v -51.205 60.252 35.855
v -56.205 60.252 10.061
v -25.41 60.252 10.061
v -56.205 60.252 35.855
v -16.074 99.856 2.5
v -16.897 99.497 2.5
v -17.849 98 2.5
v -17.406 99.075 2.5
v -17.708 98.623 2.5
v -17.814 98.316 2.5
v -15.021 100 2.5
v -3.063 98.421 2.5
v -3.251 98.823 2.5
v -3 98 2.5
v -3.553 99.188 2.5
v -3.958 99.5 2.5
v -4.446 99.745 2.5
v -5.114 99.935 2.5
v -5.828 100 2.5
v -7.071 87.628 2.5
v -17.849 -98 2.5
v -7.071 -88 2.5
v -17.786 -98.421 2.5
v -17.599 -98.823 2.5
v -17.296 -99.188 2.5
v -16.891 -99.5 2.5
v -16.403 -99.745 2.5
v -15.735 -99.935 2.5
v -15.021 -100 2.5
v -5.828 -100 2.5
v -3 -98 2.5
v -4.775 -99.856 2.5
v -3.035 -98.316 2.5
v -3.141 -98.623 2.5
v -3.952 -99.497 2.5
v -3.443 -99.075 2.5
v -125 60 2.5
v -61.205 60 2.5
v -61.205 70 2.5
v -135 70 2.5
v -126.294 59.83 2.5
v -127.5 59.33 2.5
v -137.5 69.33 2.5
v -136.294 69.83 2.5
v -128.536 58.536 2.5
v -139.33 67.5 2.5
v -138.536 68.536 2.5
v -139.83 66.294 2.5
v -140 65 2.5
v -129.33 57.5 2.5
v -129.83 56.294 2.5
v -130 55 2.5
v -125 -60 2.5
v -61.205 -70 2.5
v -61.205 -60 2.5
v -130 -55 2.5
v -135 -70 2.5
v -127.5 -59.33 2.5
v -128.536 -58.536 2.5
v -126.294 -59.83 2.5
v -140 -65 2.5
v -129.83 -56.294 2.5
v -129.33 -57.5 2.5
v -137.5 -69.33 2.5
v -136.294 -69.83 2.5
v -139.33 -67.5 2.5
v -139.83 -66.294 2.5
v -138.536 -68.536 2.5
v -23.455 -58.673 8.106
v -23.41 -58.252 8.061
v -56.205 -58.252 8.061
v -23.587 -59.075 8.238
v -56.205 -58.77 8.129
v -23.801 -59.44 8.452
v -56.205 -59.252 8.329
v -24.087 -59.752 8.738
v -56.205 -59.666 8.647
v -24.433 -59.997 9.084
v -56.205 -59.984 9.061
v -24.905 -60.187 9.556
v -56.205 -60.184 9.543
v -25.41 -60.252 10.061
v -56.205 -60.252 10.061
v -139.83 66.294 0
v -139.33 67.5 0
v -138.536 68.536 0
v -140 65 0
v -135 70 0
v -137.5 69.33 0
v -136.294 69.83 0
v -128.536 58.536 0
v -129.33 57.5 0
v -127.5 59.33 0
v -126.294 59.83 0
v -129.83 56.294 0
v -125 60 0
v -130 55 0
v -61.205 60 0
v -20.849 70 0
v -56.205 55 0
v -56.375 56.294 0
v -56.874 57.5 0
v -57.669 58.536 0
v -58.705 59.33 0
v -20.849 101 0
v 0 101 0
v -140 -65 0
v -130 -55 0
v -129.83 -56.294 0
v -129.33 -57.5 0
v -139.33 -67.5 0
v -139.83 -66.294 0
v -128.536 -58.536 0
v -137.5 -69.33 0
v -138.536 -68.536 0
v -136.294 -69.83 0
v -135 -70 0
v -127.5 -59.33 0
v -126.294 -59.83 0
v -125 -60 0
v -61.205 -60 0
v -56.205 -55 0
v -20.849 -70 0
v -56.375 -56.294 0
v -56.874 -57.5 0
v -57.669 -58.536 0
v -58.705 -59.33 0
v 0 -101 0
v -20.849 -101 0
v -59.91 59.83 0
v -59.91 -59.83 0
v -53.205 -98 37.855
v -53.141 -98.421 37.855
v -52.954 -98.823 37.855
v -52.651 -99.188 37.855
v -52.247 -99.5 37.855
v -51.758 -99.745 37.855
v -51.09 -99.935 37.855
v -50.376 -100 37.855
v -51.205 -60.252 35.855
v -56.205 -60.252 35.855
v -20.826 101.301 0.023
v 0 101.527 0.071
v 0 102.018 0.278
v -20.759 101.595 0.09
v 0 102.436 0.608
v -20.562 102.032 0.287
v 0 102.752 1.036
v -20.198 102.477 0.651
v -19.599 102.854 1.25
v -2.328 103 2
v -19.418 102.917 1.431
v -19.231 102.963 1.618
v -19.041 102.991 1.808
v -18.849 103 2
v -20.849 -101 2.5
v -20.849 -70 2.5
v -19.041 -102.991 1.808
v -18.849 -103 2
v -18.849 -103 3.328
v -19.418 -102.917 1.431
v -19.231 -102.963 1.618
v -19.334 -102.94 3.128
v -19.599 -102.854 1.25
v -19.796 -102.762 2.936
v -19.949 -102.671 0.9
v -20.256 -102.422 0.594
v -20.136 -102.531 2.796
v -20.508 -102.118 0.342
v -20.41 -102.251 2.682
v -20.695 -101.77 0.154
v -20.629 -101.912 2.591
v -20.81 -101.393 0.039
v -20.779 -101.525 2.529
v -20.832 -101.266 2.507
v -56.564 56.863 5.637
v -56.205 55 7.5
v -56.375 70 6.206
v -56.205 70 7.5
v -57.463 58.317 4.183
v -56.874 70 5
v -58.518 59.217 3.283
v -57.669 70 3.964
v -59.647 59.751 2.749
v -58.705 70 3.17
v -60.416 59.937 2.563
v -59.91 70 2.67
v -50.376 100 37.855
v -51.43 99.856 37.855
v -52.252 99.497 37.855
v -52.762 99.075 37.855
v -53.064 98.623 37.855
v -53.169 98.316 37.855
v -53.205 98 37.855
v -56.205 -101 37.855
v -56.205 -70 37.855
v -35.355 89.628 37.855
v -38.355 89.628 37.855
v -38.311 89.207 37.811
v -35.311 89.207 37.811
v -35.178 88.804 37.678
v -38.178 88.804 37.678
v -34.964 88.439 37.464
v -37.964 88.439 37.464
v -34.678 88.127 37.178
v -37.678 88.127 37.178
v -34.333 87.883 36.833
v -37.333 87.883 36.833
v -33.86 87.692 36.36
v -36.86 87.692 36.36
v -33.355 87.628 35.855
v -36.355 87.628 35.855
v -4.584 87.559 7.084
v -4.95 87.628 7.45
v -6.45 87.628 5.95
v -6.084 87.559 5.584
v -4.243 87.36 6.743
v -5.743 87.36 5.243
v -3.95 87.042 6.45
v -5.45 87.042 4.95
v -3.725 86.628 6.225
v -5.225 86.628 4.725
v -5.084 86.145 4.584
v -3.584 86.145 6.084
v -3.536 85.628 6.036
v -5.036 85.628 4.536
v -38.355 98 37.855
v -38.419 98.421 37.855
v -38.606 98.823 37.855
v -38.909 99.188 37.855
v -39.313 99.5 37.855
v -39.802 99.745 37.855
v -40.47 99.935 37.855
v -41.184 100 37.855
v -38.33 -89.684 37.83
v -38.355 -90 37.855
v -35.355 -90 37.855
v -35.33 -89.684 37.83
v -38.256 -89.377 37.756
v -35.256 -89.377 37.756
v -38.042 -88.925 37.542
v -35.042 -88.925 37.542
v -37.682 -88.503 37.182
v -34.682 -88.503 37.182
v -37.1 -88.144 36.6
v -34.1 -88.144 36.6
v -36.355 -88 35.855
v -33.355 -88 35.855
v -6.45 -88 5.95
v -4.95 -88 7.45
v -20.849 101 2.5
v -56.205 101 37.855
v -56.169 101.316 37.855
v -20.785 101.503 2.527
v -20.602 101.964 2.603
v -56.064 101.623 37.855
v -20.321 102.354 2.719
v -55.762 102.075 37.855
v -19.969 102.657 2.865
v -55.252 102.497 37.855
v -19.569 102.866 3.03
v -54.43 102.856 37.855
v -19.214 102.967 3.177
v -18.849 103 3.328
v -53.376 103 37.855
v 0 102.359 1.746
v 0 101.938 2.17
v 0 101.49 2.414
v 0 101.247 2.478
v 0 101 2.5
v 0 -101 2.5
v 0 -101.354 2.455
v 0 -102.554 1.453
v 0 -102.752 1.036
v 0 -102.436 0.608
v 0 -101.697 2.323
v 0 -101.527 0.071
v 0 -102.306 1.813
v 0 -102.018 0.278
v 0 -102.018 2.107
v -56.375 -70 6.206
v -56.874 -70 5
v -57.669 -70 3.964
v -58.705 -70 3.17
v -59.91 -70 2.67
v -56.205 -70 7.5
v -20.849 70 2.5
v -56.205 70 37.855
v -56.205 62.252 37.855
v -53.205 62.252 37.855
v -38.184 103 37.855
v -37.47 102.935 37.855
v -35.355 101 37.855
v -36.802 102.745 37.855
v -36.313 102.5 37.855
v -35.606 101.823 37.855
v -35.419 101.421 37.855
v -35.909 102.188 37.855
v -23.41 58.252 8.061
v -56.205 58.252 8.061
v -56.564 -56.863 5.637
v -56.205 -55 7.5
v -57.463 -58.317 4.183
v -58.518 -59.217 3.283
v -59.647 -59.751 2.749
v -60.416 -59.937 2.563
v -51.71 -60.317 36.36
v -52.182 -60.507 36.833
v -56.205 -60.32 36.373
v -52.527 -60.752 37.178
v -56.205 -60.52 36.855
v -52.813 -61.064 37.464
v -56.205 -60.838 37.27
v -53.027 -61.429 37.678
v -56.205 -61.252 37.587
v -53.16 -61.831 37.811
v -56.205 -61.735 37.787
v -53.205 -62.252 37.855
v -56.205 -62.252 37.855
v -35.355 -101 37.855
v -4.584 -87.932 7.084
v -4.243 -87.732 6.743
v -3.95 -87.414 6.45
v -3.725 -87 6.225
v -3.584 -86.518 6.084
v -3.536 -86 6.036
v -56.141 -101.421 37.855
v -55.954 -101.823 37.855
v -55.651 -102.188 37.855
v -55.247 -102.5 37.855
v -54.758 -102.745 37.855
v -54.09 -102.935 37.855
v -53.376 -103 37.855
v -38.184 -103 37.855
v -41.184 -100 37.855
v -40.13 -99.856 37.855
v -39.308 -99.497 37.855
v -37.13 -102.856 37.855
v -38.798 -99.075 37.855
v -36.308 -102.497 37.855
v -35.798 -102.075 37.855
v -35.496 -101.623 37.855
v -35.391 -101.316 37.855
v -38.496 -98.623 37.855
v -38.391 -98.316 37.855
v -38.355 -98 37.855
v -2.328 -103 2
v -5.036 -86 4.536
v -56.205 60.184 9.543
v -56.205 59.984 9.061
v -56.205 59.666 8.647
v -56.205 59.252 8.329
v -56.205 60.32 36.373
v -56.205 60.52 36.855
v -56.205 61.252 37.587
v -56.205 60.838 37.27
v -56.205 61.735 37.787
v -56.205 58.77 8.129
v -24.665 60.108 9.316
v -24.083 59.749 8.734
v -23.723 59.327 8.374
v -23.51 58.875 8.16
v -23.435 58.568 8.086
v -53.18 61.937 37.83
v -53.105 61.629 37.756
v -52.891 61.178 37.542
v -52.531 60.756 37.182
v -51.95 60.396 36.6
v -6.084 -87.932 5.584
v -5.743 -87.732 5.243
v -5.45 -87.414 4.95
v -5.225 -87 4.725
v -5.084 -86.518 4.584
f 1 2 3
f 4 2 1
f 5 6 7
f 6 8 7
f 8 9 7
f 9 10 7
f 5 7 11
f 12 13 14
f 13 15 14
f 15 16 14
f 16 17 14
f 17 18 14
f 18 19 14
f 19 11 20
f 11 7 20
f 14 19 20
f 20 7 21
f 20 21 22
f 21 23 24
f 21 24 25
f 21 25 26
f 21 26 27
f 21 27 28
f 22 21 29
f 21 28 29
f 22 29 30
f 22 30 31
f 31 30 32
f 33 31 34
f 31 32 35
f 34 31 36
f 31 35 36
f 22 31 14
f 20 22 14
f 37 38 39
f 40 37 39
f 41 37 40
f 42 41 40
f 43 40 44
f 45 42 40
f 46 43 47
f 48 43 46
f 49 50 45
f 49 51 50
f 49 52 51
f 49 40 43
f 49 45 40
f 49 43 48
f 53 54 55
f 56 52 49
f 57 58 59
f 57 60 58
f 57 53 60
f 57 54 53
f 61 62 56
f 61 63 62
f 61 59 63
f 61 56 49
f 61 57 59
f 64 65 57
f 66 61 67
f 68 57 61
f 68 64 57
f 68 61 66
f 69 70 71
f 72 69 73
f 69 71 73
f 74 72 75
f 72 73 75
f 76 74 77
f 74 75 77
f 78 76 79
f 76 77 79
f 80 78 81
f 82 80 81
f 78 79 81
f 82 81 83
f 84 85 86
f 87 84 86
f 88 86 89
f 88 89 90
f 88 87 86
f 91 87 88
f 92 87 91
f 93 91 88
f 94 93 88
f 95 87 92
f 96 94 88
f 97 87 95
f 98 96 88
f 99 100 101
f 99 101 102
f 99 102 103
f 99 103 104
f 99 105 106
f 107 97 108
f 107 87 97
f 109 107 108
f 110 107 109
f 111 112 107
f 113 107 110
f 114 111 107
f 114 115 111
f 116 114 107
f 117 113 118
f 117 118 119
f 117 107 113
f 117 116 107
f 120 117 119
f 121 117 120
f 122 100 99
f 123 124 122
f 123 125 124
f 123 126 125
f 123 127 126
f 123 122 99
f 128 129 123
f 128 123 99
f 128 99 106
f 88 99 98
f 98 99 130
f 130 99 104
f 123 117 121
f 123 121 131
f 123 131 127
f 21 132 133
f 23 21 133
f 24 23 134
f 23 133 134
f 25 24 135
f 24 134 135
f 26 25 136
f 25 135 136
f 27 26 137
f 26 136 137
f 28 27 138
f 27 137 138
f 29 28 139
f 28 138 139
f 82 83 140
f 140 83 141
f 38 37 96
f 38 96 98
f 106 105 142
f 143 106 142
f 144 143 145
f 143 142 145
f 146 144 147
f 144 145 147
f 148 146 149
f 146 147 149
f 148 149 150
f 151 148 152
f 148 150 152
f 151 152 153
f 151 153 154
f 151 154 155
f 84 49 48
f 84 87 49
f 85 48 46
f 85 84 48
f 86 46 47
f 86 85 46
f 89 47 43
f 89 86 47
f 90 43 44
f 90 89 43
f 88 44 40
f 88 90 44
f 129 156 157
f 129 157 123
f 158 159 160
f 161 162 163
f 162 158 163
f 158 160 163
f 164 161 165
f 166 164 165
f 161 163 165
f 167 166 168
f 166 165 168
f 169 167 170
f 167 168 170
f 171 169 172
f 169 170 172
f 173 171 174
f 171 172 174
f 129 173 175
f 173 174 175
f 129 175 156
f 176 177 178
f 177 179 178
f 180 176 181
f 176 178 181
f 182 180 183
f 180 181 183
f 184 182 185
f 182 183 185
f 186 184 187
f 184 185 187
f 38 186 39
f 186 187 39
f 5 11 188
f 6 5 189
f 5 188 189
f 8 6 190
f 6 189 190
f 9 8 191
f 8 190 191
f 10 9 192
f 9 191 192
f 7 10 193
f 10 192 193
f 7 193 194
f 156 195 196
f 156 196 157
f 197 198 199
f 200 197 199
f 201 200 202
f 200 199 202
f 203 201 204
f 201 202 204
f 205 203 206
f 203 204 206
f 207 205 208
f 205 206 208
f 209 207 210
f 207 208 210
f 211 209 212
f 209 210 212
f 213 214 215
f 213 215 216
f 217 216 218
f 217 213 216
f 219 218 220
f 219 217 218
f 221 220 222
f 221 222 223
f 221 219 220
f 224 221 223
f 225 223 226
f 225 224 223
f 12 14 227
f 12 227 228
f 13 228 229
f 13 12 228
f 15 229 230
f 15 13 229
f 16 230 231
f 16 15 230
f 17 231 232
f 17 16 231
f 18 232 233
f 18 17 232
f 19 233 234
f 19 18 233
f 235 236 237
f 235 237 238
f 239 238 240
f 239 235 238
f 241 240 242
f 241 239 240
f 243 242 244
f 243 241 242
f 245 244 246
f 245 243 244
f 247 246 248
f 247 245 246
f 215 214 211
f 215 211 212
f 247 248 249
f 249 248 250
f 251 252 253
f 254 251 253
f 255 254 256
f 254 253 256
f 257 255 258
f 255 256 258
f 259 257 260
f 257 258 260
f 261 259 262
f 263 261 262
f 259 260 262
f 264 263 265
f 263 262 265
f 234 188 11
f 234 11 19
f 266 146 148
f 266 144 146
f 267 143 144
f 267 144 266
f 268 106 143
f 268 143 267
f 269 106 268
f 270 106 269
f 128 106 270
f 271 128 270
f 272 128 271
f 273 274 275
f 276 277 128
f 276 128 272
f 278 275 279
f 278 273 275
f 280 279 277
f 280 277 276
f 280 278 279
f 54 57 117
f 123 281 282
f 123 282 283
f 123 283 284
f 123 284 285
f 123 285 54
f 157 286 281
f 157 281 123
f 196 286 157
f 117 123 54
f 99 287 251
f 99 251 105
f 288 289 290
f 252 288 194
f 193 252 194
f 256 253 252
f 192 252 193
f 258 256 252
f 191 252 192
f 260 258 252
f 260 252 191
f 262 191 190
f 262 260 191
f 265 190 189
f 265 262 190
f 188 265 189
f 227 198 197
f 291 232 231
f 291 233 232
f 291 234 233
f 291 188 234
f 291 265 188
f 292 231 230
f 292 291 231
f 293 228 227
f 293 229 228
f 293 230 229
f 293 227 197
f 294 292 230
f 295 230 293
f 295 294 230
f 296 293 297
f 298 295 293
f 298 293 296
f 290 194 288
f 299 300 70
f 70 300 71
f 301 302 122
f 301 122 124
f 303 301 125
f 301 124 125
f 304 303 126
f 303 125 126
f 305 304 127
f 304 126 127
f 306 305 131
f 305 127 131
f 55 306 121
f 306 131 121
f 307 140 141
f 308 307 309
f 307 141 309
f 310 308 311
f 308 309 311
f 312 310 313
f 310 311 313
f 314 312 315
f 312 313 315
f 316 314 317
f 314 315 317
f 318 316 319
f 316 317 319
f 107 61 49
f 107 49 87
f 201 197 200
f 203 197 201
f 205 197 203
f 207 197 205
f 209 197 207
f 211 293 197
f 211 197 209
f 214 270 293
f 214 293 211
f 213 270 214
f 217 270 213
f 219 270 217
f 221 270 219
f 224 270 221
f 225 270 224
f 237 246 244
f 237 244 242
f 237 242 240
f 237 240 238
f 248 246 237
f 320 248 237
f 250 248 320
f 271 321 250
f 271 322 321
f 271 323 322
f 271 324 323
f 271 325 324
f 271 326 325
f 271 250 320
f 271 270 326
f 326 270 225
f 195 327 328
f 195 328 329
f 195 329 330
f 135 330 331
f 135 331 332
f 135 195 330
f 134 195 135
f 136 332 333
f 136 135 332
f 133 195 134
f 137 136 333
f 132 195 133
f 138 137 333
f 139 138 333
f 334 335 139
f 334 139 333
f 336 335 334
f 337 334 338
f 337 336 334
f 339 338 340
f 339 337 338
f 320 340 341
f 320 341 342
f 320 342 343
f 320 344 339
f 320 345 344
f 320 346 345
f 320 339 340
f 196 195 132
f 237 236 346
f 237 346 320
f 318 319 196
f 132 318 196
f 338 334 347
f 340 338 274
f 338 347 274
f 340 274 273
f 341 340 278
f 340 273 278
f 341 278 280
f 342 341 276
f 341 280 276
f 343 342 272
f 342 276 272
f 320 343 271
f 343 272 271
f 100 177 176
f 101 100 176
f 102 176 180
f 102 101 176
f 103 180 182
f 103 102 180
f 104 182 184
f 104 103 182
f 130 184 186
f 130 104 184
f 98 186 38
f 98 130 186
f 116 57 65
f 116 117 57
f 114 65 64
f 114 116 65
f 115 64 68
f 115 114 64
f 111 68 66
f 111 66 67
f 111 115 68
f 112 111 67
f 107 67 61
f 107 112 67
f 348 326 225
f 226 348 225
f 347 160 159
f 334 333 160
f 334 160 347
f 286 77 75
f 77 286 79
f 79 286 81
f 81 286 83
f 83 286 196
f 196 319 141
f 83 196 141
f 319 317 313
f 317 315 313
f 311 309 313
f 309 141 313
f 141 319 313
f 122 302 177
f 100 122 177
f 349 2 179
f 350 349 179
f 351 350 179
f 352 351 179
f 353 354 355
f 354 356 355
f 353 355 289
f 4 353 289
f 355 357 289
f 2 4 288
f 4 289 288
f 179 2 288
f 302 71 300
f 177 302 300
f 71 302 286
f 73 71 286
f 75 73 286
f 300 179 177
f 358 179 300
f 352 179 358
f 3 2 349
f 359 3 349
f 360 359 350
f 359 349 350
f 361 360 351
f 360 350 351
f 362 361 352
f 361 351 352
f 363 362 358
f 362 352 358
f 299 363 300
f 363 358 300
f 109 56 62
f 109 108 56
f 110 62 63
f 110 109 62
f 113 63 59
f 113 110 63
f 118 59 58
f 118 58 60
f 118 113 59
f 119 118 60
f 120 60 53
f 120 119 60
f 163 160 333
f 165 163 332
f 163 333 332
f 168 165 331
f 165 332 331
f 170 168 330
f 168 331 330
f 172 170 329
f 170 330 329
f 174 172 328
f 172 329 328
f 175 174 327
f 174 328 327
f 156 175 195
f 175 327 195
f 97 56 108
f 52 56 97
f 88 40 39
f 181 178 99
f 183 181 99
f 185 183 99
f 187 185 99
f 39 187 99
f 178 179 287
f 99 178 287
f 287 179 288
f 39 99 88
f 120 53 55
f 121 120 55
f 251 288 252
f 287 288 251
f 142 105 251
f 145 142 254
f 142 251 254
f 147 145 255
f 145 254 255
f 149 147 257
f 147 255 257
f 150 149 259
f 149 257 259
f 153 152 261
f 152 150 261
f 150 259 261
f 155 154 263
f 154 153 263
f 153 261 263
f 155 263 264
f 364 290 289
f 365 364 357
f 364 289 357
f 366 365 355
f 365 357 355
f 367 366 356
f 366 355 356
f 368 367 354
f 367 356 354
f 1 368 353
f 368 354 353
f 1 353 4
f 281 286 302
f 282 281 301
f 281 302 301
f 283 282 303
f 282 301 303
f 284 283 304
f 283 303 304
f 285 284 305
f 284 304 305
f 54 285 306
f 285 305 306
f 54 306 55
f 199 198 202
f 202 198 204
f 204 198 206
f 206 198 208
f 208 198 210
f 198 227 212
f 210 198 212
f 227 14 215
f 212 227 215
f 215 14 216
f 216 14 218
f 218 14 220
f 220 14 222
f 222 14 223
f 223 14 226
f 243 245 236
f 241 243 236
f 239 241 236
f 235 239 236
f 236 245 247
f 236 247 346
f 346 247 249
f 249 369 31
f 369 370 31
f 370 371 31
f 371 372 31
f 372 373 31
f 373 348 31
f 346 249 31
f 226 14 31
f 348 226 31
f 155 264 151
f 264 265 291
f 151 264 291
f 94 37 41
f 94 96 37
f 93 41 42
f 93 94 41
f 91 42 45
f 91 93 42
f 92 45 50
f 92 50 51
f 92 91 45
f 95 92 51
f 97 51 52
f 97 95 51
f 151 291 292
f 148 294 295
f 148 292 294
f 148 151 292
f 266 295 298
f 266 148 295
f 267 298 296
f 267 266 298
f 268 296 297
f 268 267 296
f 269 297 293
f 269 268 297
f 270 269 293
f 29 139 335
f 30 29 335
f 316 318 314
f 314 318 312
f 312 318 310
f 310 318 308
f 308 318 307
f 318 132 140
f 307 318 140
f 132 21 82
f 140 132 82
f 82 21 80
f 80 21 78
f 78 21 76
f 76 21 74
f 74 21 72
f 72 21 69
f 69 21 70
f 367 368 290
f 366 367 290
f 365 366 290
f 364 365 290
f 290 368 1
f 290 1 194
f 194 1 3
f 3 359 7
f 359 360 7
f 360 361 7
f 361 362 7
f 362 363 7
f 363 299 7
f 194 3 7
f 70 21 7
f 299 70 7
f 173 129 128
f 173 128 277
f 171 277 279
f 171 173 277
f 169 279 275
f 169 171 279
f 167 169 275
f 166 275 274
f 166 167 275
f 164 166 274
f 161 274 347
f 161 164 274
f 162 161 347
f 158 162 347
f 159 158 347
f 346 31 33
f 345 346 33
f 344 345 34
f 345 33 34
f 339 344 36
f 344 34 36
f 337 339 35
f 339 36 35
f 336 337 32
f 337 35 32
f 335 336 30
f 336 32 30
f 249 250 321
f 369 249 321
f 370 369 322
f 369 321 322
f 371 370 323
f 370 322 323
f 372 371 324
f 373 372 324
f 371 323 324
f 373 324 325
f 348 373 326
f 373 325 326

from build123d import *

# Parameters (mm, degrees)
F1_DEPTH      = 70
F2_DEPTH      = 103
F3_DEPTH      = 100
F4_W          = 175.6275002956
F4_H          = 18.8999543782
F4_H_2        = 45
F5_DEPTH      = 5
F6_DEPTH      = 70
F7_W          = 60.2522194386
F7_H          = 29.7944860623
F8_DEPTH      = 77
F9_W          = 73.7954185358
F9_H          = 120
F10_DEPTH     = 25
F11_R         = 5
F12_T1_DEPTH  = 2.1213203436
F12_T6_DEPTH  = 60
F12_T12_DEPTH = 60
F12_T18_DEPTH = 60
F12_T24_DEPTH = 60
F12_T30_DEPTH = 37.7944860623
F12_T35_DEPTH = 37.7944860623
F12_T37_DEPTH = 60
F12_T39_DEPTH = 13
F12_T41_DEPTH = 13
F12_T43_DEPTH = 30.8492424049
F12_T48_DEPTH = 60
F12_T53_DEPTH = 60
F12_T58_DEPTH = 12.5
F12_T63_DEPTH = 12.5
F12_T69_DEPTH = 7.5
F12_T73_DEPTH = 60
F12_T81_DEPTH = 7.5
F12_T85_DEPTH = 60


# Not quite as in the source:
# - a fillet or chamfer that OpenCascade refuses, or shapes differently, is made with other operations: its cross-section is extruded or revolved along the edge and cut away or added


with BuildPart() as f1:
    # F0 (on Front) → F1 (new body, symmetric)
    with BuildSketch(Plane.XZ):
        Polygon((-140, 0), (-20.8492424049, 0), (-20.8492424049, 2.5), (-53.2045814642, 2.5), (-56.2045814642, 2.5), (-140, 2.5), align=None)
    extrude(amount=F1_DEPTH, both=True)

    # F0 (on Front) → F2 (join, symmetric)
    with BuildSketch(Plane.XZ):
        Polygon((-20.8492424049, 0), (0, 0), (0, 2.5), (-3, 2.5), (-17.8492424049, 2.5), (-20.8492424049, 2.5), align=None)
        Polygon((-53.2045814642, 34.8553390593), (-20.8492424049, 2.5), (-17.8492424049, 2.5), (-53.2045814642, 37.8553390593), (-56.2045814642, 37.8553390593), align=None)
        Polygon((-3, 2.5), (0, 2.5), (-35.3553390593, 37.8553390593), (-38.3553390593, 37.8553390593), align=None)
        Polygon((-17.8492424049, 2.5), (-3, 2.5), (-38.3553390593, 37.8553390593), (-53.2045814642, 37.8553390593), align=None)
    extrude(amount=F2_DEPTH, both=True)

    # F0 (on Front) → F3 (cut, symmetric)
    with BuildSketch(Plane.XZ):
        Polygon((-17.8492424049, 2.5), (-3, 2.5), (-38.3553390593, 37.8553390593), (-53.2045814642, 37.8553390593), align=None)
    extrude(amount=F3_DEPTH, both=True, mode=Mode.SUBTRACT)

    # F4 (on face) → F5 (cut)
    with BuildSketch(Plane(origin=(1.25, 0, 1.25), x_dir=(0, 1, 0), z_dir=(0.7071067812, 0, 0.7071067812))):
        with Locations((-0.1862498522, 61.217744142)):
            Rectangle(F4_W, F4_H)
        with Locations((-0.1862498522, 29.267766953)):
            Rectangle(F4_W, F4_H_2)
    extrude(amount=-F5_DEPTH, mode=Mode.SUBTRACT)

    # F0 (on Front) → F6 (join, symmetric)
    with BuildSketch(Plane.XZ):
        Polygon((-53.2045814642, 2.5), (-20.8492424049, 2.5), (-53.2045814642, 34.8553390593), align=None)
        Polygon((-56.2045814642, 2.5), (-53.2045814642, 2.5), (-53.2045814642, 34.8553390593), (-56.2045814642, 37.8553390593), align=None)
    extrude(amount=F6_DEPTH, both=True)

    # F7 (on face) → F8 (cut)
    with BuildSketch(Plane(origin=(-56.2045814642, 0, 0), x_dir=(0, -1, 0), z_dir=(-1, 0, 0))):
        with Locations((-30.1261097193, 22.9580960282)):
            Rectangle(F7_W, F7_H)
        with Locations((30.1261097193, 22.9580960282)):
            Rectangle(F7_W, F7_H)
    extrude(amount=-F8_DEPTH, mode=Mode.SUBTRACT)

    # F9 (on face) → F10 (cut)
    with BuildSketch(Plane.XY.offset(2.5)):
        with Locations((-93.1022907321, 0)):
            Rectangle(F9_W, F9_H)
    extrude(amount=-F10_DEPTH, mode=Mode.SUBTRACT)

    # F11
    f11_edges = [f1.edges().sort_by_distance(p)[0] for p in [
        (-56.204581, 65, 2.5),
        (-56.204581, -65, 2.5),
        (-140, -70, 1.25),
        (-140, 70, 1.25),
        (-130, -60, 1.25),
        (-130, 60, 1.25),
        (-56.204581, 60, 1.25),
        (-56.204581, -60, 1.25),
    ]]
    fillet(f11_edges, radius=F11_R)

    # F12: fillet of radius 2 on 20 edges, made by hand

    # F12_s2 → F12_t1 (join)
    with BuildSketch(Plane(origin=(1.25, 0, 1.25), x_dir=(0, 1, 0), z_dir=(-0.7071067812, 0, -0.7071067812))):
        with BuildLine():
            ThreePointArc((87.6275002956, -8.767766953), (87.041713858, -7.3535533906), (85.6275002956, -6.767766953))
            Line((85.6275002956, -6.767766953), (87.6275002956, -6.767766953))
            Line((87.6275002956, -6.767766953), (87.6275002956, -8.767766953))
        make_face()
        with BuildLine():
            ThreePointArc((-88, -8.767766953), (-87.4142135624, -7.3535533906), (-86, -6.767766953))
            Line((-86, -6.767766953), (-88, -6.767766953))
            Line((-88, -6.767766953), (-88, -8.767766953))
        make_face()
    extrude(amount=F12_T1_DEPTH)


with BuildPart() as f12_tool4:
    # F12_s5 → F12_t6 (new body)
    with BuildSketch(Plane(origin=(0.7855339059, 0, -0.7855339059), x_dir=(0, 1, 0), z_dir=(-0.7071067812, 0, 0.7071067812))):
        with BuildLine():
            ThreePointArc((-98, 0.3535533906), (-99.4142135624, 0.9393398282), (-100, 2.3535533906))
            Line((-100, 2.3535533906), (-100, 0.3535533906))
            Line((-100, 0.3535533906), (-98, 0.3535533906))
        make_face()
    extrude(amount=F12_T6_DEPTH)

    split(bisect_by=Plane.XY.offset(37.8553390593), keep=Keep.BOTTOM)

    split(bisect_by=Plane.XY.offset(2.5), keep=Keep.TOP)


with BuildPart() as f1_1:
    add(f1.part)

    # F12_t3: union F12_tool4
    add(f12_tool4.part)


with BuildPart() as f12_tool10:
    # F12_s11 → F12_t12 (new body)
    with BuildSketch(Plane(origin=(-49.0654941677, 0, 49.0654941677), x_dir=(0, 1, 0), z_dir=(0.7071067812, 0, -0.7071067812))):
        with BuildLine():
            ThreePointArc((-98, -10.8535533906), (-99.4142135624, -10.267766953), (-100, -8.8535533906))
            Line((-100, -8.8535533906), (-100, -10.8535533906))
            Line((-100, -10.8535533906), (-98, -10.8535533906))
        make_face()
    extrude(amount=F12_T12_DEPTH)

    split(bisect_by=Plane.XY.offset(37.8553390593), keep=Keep.BOTTOM)

    split(bisect_by=Plane.XY.offset(2.5), keep=Keep.TOP)


with BuildPart() as f1_2:
    add(f1_1.part)

    # F12_t9: union F12_tool10
    add(f12_tool10.part)


with BuildPart() as f12_tool16:
    # F12_s17 → F12_t18 (new body)
    with BuildSketch(Plane(origin=(-49.0654941677, 0, 49.0654941677), x_dir=(0, 1, 0), z_dir=(0.7071067812, 0, -0.7071067812))):
        with BuildLine():
            ThreePointArc((100, -8.8535533906), (99.4142135624, -10.267766953), (98, -10.8535533906))
            Line((98, -10.8535533906), (100, -10.8535533906))
            Line((100, -10.8535533906), (100, -8.8535533906))
        make_face()
    extrude(amount=F12_T18_DEPTH)

    split(bisect_by=Plane.XY.offset(37.8553390593), keep=Keep.BOTTOM)

    split(bisect_by=Plane.XY.offset(2.5), keep=Keep.TOP)


with BuildPart() as f1_3:
    add(f1_2.part)

    # F12_t15: union F12_tool16
    add(f12_tool16.part)


with BuildPart() as f12_tool22:
    # F12_s23 → F12_t24 (new body)
    with BuildSketch(Plane(origin=(0.7855339059, 0, -0.7855339059), x_dir=(0, 1, 0), z_dir=(-0.7071067812, 0, 0.7071067812))):
        with BuildLine():
            ThreePointArc((98, 0.3535533906), (99.4142135624, 0.9393398282), (100, 2.3535533906))
            Line((100, 2.3535533906), (100, 0.3535533906))
            Line((100, 0.3535533906), (98, 0.3535533906))
        make_face()
    extrude(amount=F12_T24_DEPTH)

    split(bisect_by=Plane.XY.offset(37.8553390593), keep=Keep.BOTTOM)

    split(bisect_by=Plane.XY.offset(2.5), keep=Keep.TOP)


with BuildPart() as f1_4:
    add(f1_3.part)

    # F12_t21: union F12_tool22
    add(f12_tool22.part)


with BuildPart() as f12_tool28:
    # F12_s29 → F12_t30 (new body)
    with BuildSketch(Plane.YZ.offset(-56.2045814642)):
        with BuildLine():
            ThreePointArc((-58.2522194386, 8.060852997), (-59.6664330009, 8.6466394346), (-60.2522194386, 10.060852997))
            Line((-60.2522194386, 10.060852997), (-60.2522194386, 8.060852997))
            Line((-60.2522194386, 8.060852997), (-58.2522194386, 8.060852997))
        make_face()
    extrude(amount=F12_T30_DEPTH)

    split(bisect_by=Plane(origin=(-7.6746212025, 0, -7.6746212025), x_dir=(0, 1, 0), z_dir=(-0.7071067812, 0, -0.7071067812)), keep=Keep.TOP)


with BuildPart() as f1_5:
    add(f1_4.part)

    # F12_t27: union F12_tool28
    add(f12_tool28.part)


with BuildPart() as f12_tool33:
    # F12_s34 → F12_t35 (new body)
    with BuildSketch(Plane.YZ.offset(-56.2045814642)):
        with BuildLine():
            ThreePointArc((60.2522194386, 10.060852997), (59.6664330009, 8.6466394346), (58.2522194386, 8.060852997))
            Line((58.2522194386, 8.060852997), (60.2522194386, 8.060852997))
            Line((60.2522194386, 8.060852997), (60.2522194386, 10.060852997))
        make_face()
    extrude(amount=F12_T35_DEPTH)

    split(bisect_by=Plane(origin=(-7.6746212025, 0, -7.6746212025), x_dir=(0, 1, 0), z_dir=(-0.7071067812, 0, -0.7071067812)), keep=Keep.TOP)


with BuildPart() as f1_6:
    add(f1_5.part)

    # F12_t32: union F12_tool33
    add(f12_tool33.part)

    # F12_s38 → F12_t37 (cut)
    with BuildSketch(Plane(origin=(2.2855339059, 0, -2.2855339059), x_dir=(0, 1, 0), z_dir=(-0.7071067812, 0, 0.7071067812))):
        with BuildLine():
            ThreePointArc((-103, 0.232233047), (-102.4142135624, -1.1819805153), (-101, -1.767766953))
            Line((-101, -1.767766953), (-103, -1.767766953))
            Line((-103, -1.767766953), (-103, 0.232233047))
        make_face()
        with BuildLine():
            ThreePointArc((103, 0.232233047), (102.4142135624, -1.1819805153), (101, -1.767766953))
            Line((101, -1.767766953), (103, -1.767766953))
            Line((103, -1.767766953), (103, 0.232233047))
        make_face()
    extrude(amount=F12_T37_DEPTH, mode=Mode.SUBTRACT)

    # F12_s40 → F12_t39 (cut)
    with BuildSketch(Plane.YZ.offset(-43.3553390593)):
        with BuildLine():
            ThreePointArc((-90, 37.8553390593), (-88.5857864376, 37.2695526217), (-88, 35.8553390593))
            Line((-88, 35.8553390593), (-88, 37.8553390593))
            Line((-88, 37.8553390593), (-90, 37.8553390593))
        make_face()
        with BuildLine():
            ThreePointArc((89.6275002956, 37.8553390593), (88.2132867333, 37.2695526217), (87.6275002956, 35.8553390593))
            Line((87.6275002956, 35.8553390593), (87.6275002956, 37.8553390593))
            Line((87.6275002956, 37.8553390593), (89.6275002956, 37.8553390593))
        make_face()
    extrude(amount=F12_T39_DEPTH, mode=Mode.SUBTRACT)

    # F12_s42 → F12_t41 (cut)
    with BuildSketch(Plane.YZ.offset(-61.2045814642)):
        with BuildLine():
            ThreePointArc((62.2522194386, 37.8553390593), (60.8380058762, 37.2695526217), (60.2522194386, 35.8553390593))
            Line((60.2522194386, 35.8553390593), (60.2522194386, 37.8553390593))
            Line((60.2522194386, 37.8553390593), (62.2522194386, 37.8553390593))
        make_face()
        with BuildLine():
            ThreePointArc((-60.2522194386, 35.8553390593), (-60.8380058762, 37.2695526217), (-62.2522194386, 37.8553390593))
            Line((-62.2522194386, 37.8553390593), (-60.2522194386, 37.8553390593))
            Line((-60.2522194386, 37.8553390593), (-60.2522194386, 35.8553390593))
        make_face()
    extrude(amount=F12_T41_DEPTH, mode=Mode.SUBTRACT)

    # F12_s44 → F12_t43 (cut)
    with BuildSketch(Plane.YZ.offset(-25.8492424049)):
        with BuildLine():
            ThreePointArc((-101, 0), (-102.4142135624, 0.5857864376), (-103, 2))
            Line((-103, 2), (-103, 0))
            Line((-103, 0), (-101, 0))
        make_face()
        with BuildLine():
            ThreePointArc((101, 0), (102.4142135624, 0.5857864376), (103, 2))
            Line((103, 2), (103, 0))
            Line((103, 0), (101, 0))
        make_face()
    extrude(amount=F12_T43_DEPTH, mode=Mode.SUBTRACT)


with BuildPart() as f12_tool46:
    # F12_s47 → F12_t48 (new body)
    with BuildSketch(Plane(origin=(-50.5654941677, 0, 50.5654941677), x_dir=(0, 1, 0), z_dir=(0.7071067812, 0, -0.7071067812))):
        with BuildLine():
            ThreePointArc((-103, -10.9748737342), (-102.4142135624, -12.3890872965), (-101, -12.9748737342))
            Line((-101, -12.9748737342), (-103, -12.9748737342))
            Line((-103, -12.9748737342), (-103, -10.9748737342))
        make_face()
    extrude(amount=F12_T48_DEPTH)

    split(bisect_by=Plane.YZ.offset(-20.8492424049), keep=Keep.BOTTOM)


with BuildPart() as f1_7:
    add(f1_6.part)

    # F12_t45: cut F12_tool46
    add(f12_tool46.part, mode=Mode.SUBTRACT)


with BuildPart() as f12_tool51:
    # F12_s52 → F12_t53 (new body)
    with BuildSketch(Plane(origin=(-50.5654941677, 0, 50.5654941677), x_dir=(0, 1, 0), z_dir=(0.7071067812, 0, -0.7071067812))):
        with BuildLine():
            ThreePointArc((101, -12.9748737342), (102.4142135624, -12.3890872965), (103, -10.9748737342))
            Line((103, -10.9748737342), (103, -12.9748737342))
            Line((103, -12.9748737342), (101, -12.9748737342))
        make_face()
    extrude(amount=F12_T53_DEPTH)

    split(bisect_by=Plane.YZ.offset(-20.8492424049), keep=Keep.BOTTOM)


with BuildPart() as f1_8:
    add(f1_7.part)

    # F12_t50: cut F12_tool51
    add(f12_tool51.part, mode=Mode.SUBTRACT)


with BuildPart() as f12_tool56:
    # F12_s57 → F12_t58 (new body)
    with BuildSketch(Plane.XY.offset(7.5)):
        with BuildLine():
            ThreePointArc((-20.8492424049, 101), (-20.2634559673, 102.4142135624), (-18.8492424049, 103))
            Line((-18.8492424049, 103), (-20.8492424049, 103))
            Line((-20.8492424049, 103), (-20.8492424049, 101))
        make_face()
    extrude(amount=-F12_T58_DEPTH)

    split(bisect_by=Plane(origin=(-9.1746212025, 0, -9.1746212025), x_dir=(0, 1, 0), z_dir=(-0.7071067812, 0, -0.7071067812)), keep=Keep.TOP)


with BuildPart() as f1_9:
    add(f1_8.part)

    # F12_t55: cut F12_tool56
    add(f12_tool56.part, mode=Mode.SUBTRACT)


with BuildPart() as f12_tool61:
    # F12_s62 → F12_t63 (new body)
    with BuildSketch(Plane.XY.offset(7.5)):
        with BuildLine():
            ThreePointArc((-18.8492424049, -103), (-20.2634559673, -102.4142135624), (-20.8492424049, -101))
            Line((-20.8492424049, -101), (-20.8492424049, -103))
            Line((-20.8492424049, -103), (-18.8492424049, -103))
        make_face()
    extrude(amount=-F12_T63_DEPTH)

    split(bisect_by=Plane(origin=(-9.1746212025, 0, -9.1746212025), x_dir=(0, 1, 0), z_dir=(-0.7071067812, 0, -0.7071067812)), keep=Keep.TOP)


with BuildPart() as f1_10:
    add(f1_9.part)

    # F12_t60: cut F12_tool61
    add(f12_tool61.part, mode=Mode.SUBTRACT)


with BuildPart() as f12_tool67:
    # F12_s68 → F12_t69 (new body)
    with BuildSketch(Plane.XY.offset(7.5)):
        with BuildLine():
            ThreePointArc((-18.8492424049, -103), (-20.2634559673, -102.4142135624), (-20.8492424049, -101))
            Line((-20.8492424049, -101), (-20.8492424049, -103))
            Line((-20.8492424049, -103), (-18.8492424049, -103))
        make_face()
    extrude(amount=-F12_T69_DEPTH)

    split(bisect_by=Plane(origin=(-9.1746212025, 0, -9.1746212025), x_dir=(0, 1, 0), z_dir=(0.7071067812, 0, 0.7071067812)), keep=Keep.TOP)


with BuildPart() as f12_tool71:
    # F12_s72 → F12_t73 (new body)
    with BuildSketch(Plane(origin=(-50.5654941677, 0, 50.5654941677), x_dir=(0, 1, 0), z_dir=(0.7071067812, 0, -0.7071067812))):
        with BuildLine():
            ThreePointArc((-103, -10.9748737342), (-102.4142135624, -12.3890872965), (-101, -12.9748737342))
            Line((-101, -12.9748737342), (-103, -12.9748737342))
            Line((-103, -12.9748737342), (-103, -10.9748737342))
        make_face()
    extrude(amount=F12_T73_DEPTH)

    split(bisect_by=Plane.XY, keep=Keep.TOP)

    split(bisect_by=Plane.YZ.offset(-20.8492424049), keep=Keep.TOP)


with BuildPart() as f12_tool67_1:
    add(f12_tool67.part)

    # F12_t76: intersect F12_tool71
    add(f12_tool71.part, mode=Mode.INTERSECT)


with BuildPart() as f1_11:
    add(f1_10.part)

    # F12_t65: cut F12_tool67
    add(f12_tool67_1.part, mode=Mode.SUBTRACT)


with BuildPart() as f12_tool79:
    # F12_s80 → F12_t81 (new body)
    with BuildSketch(Plane.XY.offset(7.5)):
        with BuildLine():
            ThreePointArc((-20.8492424049, 101), (-20.2634559673, 102.4142135624), (-18.8492424049, 103))
            Line((-18.8492424049, 103), (-20.8492424049, 103))
            Line((-20.8492424049, 103), (-20.8492424049, 101))
        make_face()
    extrude(amount=-F12_T81_DEPTH)

    split(bisect_by=Plane(origin=(-9.1746212025, 0, -9.1746212025), x_dir=(0, 1, 0), z_dir=(0.7071067812, 0, 0.7071067812)), keep=Keep.TOP)


with BuildPart() as f12_tool83:
    # F12_s84 → F12_t85 (new body)
    with BuildSketch(Plane(origin=(-50.5654941677, 0, 50.5654941677), x_dir=(0, 1, 0), z_dir=(0.7071067812, 0, -0.7071067812))):
        with BuildLine():
            ThreePointArc((101, -12.9748737342), (102.4142135624, -12.3890872965), (103, -10.9748737342))
            Line((103, -10.9748737342), (103, -12.9748737342))
            Line((103, -12.9748737342), (101, -12.9748737342))
        make_face()
    extrude(amount=F12_T85_DEPTH)

    split(bisect_by=Plane.XY, keep=Keep.TOP)

    split(bisect_by=Plane.YZ.offset(-20.8492424049), keep=Keep.TOP)


with BuildPart() as f12_tool79_1:
    add(f12_tool79.part)

    # F12_t88: intersect F12_tool83
    add(f12_tool83.part, mode=Mode.INTERSECT)


with BuildPart() as f1_12:
    add(f1_11.part)

    # F12_t77: cut F12_tool79
    add(f12_tool79_1.part, mode=Mode.SUBTRACT)


solid = f1_12.part
